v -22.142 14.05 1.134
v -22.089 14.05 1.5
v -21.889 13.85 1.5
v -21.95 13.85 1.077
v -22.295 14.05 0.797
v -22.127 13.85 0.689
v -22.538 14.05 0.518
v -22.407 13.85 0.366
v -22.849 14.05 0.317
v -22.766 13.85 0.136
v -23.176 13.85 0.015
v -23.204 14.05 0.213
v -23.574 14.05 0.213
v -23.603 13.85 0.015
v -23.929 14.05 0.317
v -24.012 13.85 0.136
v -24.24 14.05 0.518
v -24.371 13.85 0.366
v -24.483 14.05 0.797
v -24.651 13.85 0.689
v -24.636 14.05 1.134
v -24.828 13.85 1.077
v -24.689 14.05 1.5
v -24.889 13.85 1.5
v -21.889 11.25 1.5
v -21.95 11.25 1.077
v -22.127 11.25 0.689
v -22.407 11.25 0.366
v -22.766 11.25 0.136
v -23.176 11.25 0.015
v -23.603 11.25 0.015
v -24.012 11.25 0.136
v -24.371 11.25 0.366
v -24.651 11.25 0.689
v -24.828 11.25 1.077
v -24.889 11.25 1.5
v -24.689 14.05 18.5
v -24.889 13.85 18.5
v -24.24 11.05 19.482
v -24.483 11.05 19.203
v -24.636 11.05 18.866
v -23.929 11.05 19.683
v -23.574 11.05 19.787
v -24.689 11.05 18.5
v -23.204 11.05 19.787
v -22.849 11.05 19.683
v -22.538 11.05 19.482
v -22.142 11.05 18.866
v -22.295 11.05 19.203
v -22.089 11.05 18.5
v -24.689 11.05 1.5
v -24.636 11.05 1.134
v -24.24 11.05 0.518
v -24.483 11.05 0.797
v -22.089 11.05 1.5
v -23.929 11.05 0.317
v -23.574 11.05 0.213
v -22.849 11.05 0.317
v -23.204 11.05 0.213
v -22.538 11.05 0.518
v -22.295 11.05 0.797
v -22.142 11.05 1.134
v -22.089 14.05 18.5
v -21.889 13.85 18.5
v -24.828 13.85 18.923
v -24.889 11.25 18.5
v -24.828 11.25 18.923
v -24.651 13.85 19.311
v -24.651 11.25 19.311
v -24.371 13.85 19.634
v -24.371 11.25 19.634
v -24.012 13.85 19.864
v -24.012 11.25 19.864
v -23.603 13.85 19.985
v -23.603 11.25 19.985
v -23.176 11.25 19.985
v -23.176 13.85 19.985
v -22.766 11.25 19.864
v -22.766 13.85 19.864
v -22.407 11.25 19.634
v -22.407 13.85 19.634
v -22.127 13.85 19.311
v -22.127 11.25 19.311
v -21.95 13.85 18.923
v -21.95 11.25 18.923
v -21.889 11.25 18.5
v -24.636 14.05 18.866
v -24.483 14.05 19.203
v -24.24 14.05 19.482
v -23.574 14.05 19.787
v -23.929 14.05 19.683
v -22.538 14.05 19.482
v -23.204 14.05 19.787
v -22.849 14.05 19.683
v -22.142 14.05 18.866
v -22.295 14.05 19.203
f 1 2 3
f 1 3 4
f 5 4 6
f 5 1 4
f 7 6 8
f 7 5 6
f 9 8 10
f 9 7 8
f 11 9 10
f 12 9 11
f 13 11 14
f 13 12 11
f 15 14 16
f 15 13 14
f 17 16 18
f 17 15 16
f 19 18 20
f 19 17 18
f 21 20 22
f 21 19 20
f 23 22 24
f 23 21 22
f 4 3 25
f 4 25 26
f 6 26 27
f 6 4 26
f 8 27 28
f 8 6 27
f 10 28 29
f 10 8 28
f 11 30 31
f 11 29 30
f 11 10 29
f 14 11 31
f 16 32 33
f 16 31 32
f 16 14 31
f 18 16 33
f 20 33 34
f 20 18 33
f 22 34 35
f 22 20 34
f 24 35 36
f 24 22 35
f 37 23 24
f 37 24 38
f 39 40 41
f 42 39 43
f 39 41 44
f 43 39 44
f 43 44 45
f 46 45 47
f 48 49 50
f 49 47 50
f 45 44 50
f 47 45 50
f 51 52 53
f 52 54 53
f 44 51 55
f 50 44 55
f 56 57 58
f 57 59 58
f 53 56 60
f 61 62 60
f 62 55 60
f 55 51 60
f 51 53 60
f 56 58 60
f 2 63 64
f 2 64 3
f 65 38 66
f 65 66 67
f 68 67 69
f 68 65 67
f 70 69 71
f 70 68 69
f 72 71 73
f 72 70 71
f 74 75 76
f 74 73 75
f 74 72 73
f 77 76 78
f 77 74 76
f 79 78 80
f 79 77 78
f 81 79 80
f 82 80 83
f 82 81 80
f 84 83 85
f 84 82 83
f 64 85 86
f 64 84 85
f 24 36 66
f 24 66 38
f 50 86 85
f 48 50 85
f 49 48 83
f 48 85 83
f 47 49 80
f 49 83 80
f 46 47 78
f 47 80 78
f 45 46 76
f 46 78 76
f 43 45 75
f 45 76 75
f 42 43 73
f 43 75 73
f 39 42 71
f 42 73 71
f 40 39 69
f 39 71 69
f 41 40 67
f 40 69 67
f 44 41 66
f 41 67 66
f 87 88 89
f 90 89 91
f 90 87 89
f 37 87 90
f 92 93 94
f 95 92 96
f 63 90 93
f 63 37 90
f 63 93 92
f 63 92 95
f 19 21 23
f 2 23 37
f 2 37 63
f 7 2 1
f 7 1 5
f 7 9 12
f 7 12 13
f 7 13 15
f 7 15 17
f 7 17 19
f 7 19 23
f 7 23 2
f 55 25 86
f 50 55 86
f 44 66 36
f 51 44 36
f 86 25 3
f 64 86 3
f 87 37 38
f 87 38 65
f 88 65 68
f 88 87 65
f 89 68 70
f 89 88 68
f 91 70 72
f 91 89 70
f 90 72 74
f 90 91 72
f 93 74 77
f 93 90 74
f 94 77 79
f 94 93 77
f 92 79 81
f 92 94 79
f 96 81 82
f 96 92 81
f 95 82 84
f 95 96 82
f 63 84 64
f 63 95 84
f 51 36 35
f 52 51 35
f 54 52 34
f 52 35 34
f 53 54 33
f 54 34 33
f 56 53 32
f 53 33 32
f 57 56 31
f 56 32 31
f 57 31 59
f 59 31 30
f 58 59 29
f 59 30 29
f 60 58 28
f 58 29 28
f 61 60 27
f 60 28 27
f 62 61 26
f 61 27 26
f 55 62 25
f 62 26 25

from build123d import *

# Parameters (mm, degrees)
SKETCH1_W          = 3
SKETCH1_H          = 3
EXTRUDE1_DEPTH     = 20
SKETCH2_OUTSIDE_W  = 9.09
SKETCH2_OUTSIDE_H  = 26.09
CUT_EXTRUDE1_DEPTH = 20
CHAMFER1_SIZE      = 0.2


with BuildPart() as part:
    # Sketch1 → Extrude1 (new body)
    with BuildSketch(Plane.XY):
        with Locations((-23.38908046, 12.550287356)):
            Rectangle(SKETCH1_W, SKETCH1_H)
    extrude(amount=EXTRUDE1_DEPTH)

    # Sketch2 outside → Cut-Extrude1 (cut)
    with BuildSketch(Plane(origin=(0, 14.050287356, 0), x_dir=(1, 0, 0), z_dir=(0, 1, 0))):
        with Locations((-23.389, -10)):
            Rectangle(SKETCH2_OUTSIDE_W, SKETCH2_OUTSIDE_H)
        with BuildLine():
            Line((-24.88908046, -1.5), (-24.88908046, -18.5))
            ThreePointArc((-24.88908046, -18.5), (-23.38908046, -20), (-21.88908046, -18.5))
            Line((-21.88908046, -18.5), (-21.88908046, -1.5))
            ThreePointArc((-21.88908046, -1.5), (-23.38908046, 0), (-24.88908046, -1.5))
        make_face(mode=Mode.SUBTRACT)
    extrude(amount=-CUT_EXTRUDE1_DEPTH, mode=Mode.SUBTRACT)

    # Chamfer1
    chamfer1_edges = [part.edges().sort_by_distance(p)[0] for p in [
        (-21.88908046, 14.050287356, 10),
        (-21.88908046, 11.050287356, 10),
        (-24.88908046, 11.050287356, 10),
        (-24.88908046, 14.050287356, 10),
        (-23.38908046, 14.050287356, 20),
        (-23.38908046, 14.050287356, 0),
        (-23.38908046, 11.050287356, 0),
        (-23.38908046, 11.050287356, 20),
    ]]
    chamfer(chamfer1_edges, length=CHAMFER1_SIZE)


solid = part.part
